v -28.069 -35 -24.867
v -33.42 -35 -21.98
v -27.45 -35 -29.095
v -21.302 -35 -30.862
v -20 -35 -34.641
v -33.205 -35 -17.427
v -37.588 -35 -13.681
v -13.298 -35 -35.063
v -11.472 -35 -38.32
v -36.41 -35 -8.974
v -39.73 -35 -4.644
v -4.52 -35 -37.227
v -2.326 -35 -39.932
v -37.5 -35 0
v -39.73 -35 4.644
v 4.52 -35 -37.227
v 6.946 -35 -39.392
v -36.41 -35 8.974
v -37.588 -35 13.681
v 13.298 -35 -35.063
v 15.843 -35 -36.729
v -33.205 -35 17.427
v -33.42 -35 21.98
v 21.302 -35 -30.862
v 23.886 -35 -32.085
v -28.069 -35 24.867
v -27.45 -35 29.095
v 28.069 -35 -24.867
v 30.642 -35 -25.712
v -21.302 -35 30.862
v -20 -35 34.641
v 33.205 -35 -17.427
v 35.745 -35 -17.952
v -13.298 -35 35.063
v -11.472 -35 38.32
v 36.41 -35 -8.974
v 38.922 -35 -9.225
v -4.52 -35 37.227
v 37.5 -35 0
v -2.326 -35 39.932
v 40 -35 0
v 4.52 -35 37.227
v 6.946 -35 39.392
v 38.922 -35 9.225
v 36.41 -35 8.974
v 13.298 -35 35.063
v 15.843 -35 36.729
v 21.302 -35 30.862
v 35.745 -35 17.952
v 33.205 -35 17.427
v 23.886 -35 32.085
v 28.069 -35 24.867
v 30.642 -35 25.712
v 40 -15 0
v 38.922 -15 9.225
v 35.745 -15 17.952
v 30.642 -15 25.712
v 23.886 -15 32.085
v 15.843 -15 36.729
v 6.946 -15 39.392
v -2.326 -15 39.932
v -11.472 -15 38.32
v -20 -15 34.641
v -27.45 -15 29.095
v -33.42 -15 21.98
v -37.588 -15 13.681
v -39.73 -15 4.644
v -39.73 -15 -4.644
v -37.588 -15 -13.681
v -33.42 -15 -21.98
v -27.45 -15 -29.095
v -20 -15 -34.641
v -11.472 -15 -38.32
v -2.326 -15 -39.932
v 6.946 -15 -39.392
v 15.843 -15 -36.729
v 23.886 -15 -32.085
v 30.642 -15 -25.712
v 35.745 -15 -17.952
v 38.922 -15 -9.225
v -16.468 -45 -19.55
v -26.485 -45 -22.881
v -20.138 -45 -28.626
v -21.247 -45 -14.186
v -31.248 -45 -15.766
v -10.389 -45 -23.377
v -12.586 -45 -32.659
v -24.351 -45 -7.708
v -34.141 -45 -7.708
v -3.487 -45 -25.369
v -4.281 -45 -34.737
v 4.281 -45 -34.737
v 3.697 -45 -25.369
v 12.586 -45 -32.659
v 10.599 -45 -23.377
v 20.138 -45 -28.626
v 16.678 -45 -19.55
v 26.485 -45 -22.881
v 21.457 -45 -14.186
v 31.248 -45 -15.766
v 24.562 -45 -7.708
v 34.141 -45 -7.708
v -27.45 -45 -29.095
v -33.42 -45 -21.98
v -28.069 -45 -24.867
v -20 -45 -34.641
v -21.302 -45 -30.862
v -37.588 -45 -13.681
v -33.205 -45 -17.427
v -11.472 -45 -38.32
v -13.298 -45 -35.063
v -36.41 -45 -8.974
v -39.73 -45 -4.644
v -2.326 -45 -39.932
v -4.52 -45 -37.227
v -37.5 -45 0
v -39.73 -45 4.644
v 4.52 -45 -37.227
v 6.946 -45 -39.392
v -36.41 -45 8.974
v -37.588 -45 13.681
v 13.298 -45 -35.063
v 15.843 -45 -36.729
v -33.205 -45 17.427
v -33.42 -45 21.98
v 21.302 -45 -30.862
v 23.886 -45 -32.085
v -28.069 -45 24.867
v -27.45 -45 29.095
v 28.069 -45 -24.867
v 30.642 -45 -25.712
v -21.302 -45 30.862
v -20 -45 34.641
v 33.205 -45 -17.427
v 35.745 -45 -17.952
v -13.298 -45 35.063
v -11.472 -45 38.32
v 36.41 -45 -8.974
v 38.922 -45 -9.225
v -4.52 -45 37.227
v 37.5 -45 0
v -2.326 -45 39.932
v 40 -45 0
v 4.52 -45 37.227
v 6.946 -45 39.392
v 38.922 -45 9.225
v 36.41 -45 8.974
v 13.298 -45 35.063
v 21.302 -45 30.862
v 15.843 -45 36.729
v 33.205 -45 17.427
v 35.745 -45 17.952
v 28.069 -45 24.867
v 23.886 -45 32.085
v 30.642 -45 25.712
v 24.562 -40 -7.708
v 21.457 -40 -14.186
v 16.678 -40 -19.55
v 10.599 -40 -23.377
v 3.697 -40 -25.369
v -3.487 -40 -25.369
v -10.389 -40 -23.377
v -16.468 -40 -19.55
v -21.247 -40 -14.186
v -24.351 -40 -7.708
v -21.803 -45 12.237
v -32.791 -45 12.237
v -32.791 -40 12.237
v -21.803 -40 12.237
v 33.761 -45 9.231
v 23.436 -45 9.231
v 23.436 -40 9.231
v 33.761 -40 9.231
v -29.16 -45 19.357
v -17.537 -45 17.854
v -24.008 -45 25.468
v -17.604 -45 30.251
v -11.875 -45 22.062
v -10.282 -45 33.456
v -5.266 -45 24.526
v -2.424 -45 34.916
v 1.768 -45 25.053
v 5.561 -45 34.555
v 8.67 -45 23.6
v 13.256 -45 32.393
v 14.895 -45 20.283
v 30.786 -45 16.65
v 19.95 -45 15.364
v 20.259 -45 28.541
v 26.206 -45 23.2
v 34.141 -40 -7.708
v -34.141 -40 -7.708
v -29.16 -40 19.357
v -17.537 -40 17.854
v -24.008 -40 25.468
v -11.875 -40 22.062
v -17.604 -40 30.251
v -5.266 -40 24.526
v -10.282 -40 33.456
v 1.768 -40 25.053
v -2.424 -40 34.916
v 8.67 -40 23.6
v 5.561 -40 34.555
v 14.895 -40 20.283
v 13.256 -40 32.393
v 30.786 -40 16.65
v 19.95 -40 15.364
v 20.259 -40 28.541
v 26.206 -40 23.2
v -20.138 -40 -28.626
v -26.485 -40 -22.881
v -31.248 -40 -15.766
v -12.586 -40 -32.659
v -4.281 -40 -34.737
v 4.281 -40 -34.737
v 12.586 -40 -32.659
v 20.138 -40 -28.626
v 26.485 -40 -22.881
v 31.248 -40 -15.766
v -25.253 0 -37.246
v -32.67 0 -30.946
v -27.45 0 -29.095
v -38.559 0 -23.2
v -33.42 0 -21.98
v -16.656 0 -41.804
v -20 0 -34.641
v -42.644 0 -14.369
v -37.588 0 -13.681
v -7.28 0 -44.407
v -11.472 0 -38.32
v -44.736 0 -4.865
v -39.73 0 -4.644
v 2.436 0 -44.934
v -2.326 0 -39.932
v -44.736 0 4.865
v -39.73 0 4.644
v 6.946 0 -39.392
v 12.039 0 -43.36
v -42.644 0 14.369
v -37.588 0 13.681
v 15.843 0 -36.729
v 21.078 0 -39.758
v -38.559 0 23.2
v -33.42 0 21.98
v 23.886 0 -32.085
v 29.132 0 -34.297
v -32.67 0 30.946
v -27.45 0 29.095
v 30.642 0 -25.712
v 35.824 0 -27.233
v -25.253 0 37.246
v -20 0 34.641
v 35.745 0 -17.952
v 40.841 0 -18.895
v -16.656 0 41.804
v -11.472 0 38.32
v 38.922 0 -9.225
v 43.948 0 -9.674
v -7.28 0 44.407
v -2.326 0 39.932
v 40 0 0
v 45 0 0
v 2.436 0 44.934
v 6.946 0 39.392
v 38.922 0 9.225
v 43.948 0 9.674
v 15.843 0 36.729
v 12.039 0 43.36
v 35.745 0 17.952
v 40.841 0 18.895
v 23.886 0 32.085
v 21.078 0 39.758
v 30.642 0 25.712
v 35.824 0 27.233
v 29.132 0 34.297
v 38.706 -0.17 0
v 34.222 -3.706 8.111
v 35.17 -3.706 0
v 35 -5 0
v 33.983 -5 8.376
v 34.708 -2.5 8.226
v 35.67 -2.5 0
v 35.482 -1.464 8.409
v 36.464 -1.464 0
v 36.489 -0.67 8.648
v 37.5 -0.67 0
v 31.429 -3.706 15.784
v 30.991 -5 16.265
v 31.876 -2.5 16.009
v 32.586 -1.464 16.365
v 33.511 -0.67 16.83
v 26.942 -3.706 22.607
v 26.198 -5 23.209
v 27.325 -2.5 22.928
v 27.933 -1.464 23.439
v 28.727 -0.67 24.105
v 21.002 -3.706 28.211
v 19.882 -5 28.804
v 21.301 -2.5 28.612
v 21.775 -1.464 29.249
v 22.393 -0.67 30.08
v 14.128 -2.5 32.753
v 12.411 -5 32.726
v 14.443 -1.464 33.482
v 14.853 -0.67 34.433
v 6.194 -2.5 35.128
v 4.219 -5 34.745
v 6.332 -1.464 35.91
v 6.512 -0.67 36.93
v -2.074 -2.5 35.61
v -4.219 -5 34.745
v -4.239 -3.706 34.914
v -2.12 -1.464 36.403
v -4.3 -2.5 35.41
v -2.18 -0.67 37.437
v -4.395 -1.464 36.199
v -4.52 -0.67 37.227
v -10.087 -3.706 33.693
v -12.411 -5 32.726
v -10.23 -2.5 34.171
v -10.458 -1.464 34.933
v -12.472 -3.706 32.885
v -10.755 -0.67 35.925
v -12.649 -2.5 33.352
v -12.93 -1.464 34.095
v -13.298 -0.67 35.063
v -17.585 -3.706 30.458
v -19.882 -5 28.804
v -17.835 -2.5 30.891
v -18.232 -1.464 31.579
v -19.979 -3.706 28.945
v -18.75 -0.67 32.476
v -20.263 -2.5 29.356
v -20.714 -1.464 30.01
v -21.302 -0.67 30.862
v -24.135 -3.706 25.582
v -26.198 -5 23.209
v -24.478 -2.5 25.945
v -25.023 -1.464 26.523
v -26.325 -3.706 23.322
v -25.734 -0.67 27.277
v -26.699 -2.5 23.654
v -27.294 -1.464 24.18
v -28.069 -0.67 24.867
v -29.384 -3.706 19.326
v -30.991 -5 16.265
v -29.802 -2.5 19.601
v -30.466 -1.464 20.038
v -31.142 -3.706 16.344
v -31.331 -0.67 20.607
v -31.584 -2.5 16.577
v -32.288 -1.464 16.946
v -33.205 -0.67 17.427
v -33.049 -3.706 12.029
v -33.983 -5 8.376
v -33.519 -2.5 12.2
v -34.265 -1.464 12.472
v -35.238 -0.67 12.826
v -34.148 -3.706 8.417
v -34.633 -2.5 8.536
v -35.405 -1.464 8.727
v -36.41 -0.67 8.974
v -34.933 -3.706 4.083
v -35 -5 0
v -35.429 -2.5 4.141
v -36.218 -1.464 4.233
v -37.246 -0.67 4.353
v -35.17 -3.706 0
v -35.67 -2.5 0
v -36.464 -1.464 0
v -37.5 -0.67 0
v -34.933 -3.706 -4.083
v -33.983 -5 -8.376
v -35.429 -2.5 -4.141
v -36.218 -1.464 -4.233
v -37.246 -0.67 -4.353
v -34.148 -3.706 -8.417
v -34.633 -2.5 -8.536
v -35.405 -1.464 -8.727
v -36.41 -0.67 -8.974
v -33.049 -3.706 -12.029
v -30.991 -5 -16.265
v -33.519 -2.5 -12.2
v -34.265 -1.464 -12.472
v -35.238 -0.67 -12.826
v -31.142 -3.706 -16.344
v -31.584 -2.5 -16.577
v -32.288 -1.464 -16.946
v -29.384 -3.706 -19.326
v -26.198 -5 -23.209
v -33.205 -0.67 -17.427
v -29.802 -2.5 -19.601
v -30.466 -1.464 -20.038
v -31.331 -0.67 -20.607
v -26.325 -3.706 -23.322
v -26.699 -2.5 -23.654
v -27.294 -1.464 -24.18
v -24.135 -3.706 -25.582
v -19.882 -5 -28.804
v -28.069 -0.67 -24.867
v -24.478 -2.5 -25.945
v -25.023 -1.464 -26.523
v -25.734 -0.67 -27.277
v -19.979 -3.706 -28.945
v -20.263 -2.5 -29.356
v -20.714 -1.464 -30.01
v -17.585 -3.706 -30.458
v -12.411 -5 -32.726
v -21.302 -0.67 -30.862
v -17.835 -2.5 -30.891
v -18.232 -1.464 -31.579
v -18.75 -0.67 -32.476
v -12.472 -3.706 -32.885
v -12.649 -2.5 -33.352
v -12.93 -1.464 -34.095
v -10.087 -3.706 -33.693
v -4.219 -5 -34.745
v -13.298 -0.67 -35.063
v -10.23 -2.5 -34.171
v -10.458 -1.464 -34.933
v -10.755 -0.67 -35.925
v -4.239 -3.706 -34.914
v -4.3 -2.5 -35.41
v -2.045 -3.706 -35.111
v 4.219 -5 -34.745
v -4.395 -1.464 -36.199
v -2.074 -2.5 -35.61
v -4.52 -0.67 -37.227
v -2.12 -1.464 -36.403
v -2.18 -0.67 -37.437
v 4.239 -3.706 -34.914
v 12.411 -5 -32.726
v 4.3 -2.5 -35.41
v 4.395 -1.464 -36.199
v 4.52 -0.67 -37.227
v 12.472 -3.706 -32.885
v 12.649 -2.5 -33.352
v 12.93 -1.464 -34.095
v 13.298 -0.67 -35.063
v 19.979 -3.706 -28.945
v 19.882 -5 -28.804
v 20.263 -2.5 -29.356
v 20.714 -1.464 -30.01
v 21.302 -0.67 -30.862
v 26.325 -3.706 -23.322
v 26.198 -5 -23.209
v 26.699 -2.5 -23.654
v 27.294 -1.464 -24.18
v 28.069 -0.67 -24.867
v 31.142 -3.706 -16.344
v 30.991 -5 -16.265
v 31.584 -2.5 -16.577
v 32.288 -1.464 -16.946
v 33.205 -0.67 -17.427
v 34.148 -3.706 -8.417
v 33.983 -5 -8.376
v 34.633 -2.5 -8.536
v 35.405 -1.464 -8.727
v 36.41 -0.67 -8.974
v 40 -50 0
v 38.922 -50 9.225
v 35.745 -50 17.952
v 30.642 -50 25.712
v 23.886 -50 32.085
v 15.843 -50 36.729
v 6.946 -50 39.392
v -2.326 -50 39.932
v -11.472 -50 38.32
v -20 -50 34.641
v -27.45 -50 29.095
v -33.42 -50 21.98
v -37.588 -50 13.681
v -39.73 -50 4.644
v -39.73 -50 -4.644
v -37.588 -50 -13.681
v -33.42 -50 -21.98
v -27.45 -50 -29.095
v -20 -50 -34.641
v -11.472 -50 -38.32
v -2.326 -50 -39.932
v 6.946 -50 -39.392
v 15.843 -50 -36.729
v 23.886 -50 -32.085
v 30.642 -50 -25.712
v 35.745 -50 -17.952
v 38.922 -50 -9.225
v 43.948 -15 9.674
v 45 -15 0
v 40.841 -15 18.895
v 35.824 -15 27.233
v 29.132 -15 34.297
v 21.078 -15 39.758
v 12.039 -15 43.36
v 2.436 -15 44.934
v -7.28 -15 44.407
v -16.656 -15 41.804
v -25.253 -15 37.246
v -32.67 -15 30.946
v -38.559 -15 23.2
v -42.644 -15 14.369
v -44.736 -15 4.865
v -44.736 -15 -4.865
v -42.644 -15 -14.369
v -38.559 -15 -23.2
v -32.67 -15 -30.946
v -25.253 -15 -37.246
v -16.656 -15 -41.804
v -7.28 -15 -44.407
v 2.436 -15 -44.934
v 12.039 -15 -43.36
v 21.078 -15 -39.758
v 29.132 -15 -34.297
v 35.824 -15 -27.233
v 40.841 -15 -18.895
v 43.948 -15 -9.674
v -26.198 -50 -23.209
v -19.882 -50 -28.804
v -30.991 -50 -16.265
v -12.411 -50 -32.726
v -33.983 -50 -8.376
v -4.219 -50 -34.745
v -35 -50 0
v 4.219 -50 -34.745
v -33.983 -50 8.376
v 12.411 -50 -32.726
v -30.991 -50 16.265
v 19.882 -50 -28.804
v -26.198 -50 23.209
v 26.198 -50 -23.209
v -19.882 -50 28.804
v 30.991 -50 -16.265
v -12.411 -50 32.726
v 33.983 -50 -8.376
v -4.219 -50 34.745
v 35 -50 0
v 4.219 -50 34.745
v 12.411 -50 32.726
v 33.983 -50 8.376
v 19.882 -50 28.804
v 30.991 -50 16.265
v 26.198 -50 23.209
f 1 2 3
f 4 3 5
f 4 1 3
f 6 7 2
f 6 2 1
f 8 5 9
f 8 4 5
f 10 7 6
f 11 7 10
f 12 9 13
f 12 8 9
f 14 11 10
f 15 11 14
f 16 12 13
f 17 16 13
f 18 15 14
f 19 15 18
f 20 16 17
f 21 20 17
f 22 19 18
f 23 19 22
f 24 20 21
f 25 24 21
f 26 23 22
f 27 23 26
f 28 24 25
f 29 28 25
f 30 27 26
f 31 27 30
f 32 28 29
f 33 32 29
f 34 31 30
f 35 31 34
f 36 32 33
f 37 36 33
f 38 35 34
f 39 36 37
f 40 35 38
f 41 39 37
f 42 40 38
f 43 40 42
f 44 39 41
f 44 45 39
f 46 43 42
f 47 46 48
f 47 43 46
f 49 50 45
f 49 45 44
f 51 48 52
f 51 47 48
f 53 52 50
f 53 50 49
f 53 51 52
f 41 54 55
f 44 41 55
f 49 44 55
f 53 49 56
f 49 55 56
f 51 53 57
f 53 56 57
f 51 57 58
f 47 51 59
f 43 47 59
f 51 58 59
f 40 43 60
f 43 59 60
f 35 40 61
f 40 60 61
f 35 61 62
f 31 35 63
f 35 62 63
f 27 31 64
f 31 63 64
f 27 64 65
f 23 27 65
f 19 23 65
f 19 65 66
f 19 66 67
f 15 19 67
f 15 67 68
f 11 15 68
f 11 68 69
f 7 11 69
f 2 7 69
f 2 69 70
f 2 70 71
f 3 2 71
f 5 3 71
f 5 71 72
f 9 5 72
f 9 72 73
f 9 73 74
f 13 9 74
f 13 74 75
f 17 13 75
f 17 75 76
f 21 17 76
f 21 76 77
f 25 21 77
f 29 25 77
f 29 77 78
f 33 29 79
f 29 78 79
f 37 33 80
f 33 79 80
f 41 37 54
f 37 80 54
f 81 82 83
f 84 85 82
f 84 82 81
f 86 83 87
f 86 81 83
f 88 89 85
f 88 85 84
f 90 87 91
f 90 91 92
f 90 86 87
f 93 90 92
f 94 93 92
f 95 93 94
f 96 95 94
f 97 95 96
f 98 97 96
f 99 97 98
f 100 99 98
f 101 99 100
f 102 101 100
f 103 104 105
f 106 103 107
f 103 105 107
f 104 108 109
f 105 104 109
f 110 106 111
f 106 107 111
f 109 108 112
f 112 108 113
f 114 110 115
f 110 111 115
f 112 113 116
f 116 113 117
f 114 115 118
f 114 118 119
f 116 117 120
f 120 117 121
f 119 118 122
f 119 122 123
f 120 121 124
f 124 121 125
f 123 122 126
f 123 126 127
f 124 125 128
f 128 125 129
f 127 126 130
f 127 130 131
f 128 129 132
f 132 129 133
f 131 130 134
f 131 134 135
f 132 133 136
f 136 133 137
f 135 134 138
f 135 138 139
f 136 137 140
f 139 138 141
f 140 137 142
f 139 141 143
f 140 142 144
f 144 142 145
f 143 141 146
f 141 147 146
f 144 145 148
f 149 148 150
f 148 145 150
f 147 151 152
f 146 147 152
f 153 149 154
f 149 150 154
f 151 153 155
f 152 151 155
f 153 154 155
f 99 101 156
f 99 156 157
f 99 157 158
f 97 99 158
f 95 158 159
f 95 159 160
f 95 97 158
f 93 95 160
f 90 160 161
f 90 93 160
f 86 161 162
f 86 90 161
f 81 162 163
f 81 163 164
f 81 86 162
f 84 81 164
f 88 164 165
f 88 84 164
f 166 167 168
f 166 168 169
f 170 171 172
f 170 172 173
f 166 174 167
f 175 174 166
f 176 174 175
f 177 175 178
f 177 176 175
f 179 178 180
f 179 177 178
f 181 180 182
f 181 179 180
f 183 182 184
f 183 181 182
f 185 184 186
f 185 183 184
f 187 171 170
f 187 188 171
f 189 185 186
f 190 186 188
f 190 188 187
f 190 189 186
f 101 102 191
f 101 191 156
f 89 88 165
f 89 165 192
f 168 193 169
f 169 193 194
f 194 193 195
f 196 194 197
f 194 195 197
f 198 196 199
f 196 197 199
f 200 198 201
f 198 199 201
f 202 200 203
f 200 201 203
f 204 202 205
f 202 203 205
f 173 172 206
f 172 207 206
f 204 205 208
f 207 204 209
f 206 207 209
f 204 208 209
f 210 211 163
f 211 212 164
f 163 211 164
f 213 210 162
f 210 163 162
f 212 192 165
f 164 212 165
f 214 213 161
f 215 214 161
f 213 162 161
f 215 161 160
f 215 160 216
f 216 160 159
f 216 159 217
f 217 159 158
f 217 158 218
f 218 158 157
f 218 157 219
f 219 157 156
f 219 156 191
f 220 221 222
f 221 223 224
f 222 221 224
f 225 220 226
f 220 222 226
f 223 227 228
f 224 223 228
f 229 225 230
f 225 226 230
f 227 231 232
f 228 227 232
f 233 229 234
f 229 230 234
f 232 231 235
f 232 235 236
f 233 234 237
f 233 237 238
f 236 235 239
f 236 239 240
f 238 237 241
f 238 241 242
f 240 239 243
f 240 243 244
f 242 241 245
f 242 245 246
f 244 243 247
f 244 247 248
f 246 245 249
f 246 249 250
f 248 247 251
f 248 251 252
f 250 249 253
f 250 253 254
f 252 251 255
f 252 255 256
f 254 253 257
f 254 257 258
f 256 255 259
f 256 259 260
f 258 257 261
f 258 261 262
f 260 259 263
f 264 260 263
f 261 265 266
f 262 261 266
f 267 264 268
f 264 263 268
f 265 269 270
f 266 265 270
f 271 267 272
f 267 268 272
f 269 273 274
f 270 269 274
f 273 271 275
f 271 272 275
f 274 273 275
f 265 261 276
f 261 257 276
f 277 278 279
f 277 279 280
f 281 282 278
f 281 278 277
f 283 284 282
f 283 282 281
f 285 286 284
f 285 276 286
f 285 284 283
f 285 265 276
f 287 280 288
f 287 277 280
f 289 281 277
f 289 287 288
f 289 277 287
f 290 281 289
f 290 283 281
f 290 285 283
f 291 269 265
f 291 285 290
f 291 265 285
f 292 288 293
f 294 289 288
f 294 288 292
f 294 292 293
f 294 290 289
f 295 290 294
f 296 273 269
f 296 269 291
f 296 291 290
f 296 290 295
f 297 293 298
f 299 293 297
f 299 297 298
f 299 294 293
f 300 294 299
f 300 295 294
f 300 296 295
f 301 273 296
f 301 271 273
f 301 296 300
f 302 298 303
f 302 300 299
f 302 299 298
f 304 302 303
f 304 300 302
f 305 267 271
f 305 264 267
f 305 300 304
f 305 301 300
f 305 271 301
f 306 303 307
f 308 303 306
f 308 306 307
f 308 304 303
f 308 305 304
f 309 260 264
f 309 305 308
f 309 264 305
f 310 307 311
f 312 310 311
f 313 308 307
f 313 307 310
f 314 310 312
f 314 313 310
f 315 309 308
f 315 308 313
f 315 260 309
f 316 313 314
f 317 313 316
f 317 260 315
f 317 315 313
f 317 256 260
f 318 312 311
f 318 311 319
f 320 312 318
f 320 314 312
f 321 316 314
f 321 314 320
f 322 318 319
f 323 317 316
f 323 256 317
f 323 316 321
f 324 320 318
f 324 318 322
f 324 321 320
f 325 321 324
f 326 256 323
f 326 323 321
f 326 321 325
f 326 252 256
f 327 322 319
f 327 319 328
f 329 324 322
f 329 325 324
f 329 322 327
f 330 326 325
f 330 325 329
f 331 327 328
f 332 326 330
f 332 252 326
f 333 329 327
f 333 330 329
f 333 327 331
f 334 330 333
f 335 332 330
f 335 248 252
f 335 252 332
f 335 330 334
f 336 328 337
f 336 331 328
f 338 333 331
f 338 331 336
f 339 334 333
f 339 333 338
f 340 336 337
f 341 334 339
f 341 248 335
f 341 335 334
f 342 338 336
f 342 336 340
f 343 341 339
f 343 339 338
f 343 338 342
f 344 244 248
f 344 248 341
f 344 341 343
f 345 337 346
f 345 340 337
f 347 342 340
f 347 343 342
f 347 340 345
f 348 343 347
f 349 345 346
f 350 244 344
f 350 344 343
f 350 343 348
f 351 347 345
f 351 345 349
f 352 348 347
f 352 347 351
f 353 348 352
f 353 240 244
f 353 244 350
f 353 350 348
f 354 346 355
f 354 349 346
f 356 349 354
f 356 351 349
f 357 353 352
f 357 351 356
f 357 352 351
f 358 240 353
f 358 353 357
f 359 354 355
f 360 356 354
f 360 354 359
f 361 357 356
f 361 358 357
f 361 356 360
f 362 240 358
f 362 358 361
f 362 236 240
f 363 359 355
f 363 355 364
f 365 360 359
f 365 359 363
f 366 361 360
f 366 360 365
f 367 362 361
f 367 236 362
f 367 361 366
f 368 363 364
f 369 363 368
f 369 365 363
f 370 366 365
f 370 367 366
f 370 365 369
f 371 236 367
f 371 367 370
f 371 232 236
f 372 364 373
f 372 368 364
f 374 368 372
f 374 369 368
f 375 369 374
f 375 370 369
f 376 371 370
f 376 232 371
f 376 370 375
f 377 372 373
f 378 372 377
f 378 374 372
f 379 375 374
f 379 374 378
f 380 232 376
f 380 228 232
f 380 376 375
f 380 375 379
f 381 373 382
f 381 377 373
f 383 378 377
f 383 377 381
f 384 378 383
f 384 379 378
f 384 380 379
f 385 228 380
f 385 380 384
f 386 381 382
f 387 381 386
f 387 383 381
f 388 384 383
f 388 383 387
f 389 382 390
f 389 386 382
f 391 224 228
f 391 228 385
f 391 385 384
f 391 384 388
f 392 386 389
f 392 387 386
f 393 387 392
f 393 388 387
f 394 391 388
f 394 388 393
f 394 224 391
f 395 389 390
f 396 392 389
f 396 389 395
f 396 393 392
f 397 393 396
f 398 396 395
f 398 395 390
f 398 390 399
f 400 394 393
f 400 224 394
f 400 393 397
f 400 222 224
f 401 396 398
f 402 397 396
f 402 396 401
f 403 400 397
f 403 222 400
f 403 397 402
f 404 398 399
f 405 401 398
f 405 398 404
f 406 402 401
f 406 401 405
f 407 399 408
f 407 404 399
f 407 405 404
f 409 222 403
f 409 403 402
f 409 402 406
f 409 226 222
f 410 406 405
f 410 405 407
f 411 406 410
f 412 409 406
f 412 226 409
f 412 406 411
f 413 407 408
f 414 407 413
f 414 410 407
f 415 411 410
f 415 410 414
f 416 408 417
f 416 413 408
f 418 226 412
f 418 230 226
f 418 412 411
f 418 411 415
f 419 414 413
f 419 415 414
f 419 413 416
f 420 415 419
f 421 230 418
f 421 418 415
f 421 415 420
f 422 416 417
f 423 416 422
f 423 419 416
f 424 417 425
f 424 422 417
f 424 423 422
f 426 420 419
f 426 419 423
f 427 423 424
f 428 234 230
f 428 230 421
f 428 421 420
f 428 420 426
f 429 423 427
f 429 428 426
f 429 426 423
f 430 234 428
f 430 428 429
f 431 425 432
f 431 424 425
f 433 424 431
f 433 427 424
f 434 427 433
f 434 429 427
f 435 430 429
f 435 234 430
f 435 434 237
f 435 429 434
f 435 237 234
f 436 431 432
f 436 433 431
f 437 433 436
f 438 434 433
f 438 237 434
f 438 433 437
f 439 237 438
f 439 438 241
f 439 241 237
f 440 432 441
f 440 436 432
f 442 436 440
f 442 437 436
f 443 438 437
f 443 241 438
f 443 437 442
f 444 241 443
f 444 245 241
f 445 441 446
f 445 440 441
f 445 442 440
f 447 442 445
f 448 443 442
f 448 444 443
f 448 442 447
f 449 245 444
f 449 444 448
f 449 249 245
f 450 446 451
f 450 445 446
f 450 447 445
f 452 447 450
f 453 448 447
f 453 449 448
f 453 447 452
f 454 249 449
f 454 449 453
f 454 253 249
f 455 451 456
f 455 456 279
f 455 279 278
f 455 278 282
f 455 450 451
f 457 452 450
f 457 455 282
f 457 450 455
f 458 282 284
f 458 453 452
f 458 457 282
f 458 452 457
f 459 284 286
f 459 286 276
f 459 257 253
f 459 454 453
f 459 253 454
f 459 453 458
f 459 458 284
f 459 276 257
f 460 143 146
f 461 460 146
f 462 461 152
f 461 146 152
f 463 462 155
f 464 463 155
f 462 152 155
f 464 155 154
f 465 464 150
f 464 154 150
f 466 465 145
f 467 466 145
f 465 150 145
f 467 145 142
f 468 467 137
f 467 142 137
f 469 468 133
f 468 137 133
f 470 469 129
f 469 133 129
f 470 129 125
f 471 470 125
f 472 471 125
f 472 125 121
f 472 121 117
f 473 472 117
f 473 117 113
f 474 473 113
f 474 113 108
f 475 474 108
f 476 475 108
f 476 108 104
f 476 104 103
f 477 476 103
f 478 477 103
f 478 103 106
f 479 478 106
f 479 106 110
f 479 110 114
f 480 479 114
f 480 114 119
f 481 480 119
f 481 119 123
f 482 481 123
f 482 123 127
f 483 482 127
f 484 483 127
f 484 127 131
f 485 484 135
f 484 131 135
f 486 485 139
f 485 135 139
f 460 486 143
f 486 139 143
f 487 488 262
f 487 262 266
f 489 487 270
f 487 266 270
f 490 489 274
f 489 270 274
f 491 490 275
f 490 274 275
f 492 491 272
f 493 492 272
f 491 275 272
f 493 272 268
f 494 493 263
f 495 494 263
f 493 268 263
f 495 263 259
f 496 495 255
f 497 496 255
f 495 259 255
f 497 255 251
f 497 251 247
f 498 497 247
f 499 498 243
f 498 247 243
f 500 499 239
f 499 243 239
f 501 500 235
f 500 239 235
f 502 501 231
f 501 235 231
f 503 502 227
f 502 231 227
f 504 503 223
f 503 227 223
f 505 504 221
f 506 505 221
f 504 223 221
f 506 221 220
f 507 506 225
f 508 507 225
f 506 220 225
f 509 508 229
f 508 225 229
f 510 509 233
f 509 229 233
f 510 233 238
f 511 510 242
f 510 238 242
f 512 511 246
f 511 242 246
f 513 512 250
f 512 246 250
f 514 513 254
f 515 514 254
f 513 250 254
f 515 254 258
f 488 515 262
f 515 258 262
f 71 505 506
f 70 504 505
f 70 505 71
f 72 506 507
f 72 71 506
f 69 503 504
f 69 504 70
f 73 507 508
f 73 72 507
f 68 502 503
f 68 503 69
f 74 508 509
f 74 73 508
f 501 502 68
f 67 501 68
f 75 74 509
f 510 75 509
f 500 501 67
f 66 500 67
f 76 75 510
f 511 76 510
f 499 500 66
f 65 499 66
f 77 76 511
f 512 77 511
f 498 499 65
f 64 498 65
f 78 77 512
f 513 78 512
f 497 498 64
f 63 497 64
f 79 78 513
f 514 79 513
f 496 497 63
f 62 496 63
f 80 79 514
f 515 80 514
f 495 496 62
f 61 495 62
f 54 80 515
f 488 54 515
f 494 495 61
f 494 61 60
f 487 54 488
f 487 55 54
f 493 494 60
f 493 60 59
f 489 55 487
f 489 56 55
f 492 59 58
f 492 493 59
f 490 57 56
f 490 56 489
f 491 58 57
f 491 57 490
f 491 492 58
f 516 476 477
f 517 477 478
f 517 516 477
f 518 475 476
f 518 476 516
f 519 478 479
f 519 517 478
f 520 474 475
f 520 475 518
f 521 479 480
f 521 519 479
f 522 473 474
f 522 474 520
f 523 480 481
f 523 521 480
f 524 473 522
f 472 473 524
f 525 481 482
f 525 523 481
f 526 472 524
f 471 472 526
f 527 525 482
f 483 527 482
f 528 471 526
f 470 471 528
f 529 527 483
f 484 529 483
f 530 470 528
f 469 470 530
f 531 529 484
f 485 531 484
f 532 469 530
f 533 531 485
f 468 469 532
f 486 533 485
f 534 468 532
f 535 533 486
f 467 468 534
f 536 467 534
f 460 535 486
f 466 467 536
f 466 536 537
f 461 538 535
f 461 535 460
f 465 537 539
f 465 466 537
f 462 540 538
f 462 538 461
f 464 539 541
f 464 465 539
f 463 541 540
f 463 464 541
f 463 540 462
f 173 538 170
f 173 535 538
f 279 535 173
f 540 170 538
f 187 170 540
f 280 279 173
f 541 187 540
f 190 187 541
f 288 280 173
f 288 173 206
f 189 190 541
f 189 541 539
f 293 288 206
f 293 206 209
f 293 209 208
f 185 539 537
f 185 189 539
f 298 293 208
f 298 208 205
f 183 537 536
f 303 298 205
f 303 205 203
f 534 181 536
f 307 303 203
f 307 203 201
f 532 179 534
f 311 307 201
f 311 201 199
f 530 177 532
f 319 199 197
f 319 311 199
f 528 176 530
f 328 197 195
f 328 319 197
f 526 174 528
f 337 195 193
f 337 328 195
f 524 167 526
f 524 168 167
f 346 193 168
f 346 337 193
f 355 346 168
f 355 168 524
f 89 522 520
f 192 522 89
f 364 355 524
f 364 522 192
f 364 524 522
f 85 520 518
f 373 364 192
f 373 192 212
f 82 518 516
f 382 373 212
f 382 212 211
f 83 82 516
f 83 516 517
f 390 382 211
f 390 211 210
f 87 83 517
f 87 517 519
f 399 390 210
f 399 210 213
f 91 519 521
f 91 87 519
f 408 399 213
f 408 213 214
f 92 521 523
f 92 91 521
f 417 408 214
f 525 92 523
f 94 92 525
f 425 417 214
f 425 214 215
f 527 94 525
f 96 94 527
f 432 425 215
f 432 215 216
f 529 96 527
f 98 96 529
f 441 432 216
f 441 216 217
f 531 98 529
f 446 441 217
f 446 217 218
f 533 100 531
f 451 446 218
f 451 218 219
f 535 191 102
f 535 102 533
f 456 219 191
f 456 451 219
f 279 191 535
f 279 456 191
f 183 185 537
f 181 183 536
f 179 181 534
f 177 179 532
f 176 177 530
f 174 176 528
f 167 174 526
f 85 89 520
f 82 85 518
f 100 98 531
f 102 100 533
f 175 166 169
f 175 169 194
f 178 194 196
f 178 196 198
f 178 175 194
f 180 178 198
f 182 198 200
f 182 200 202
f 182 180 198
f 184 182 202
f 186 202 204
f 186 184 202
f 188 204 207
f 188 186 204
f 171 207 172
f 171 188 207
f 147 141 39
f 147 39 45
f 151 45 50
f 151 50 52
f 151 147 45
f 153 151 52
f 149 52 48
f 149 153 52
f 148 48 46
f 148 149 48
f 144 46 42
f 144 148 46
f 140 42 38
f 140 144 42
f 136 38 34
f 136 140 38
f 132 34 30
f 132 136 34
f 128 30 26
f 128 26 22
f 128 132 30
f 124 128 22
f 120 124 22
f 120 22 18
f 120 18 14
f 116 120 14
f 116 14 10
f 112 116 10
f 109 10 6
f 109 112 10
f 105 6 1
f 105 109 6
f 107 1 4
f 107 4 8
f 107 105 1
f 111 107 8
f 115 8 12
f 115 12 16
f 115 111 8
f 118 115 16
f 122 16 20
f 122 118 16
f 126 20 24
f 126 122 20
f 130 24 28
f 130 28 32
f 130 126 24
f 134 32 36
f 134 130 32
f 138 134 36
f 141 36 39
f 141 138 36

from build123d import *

# Parameters (mm, degrees)
F0_R      = 40
F0_R_2    = 35
F1_DEPTH  = 50
F2_R      = 45
F2_R_2    = 35
F3_DEPTH  = 15
F4_R      = 5
F6_R      = 40
F6_R_2    = 37.5
F7_DEPTH  = 10
F9_DEPTH  = 5
F11_DEPTH = 5


with BuildPart() as f1:
    # F0 (on Front) → F1 (new body)
    with BuildSketch(Plane.XZ):
        Circle(F0_R)
        Circle(F0_R_2, mode=Mode.SUBTRACT)
    extrude(amount=F1_DEPTH)

    # F2 (on Front) → F3 (join)
    with BuildSketch(Plane.XZ):
        Circle(F2_R)
        Circle(F2_R_2, mode=Mode.SUBTRACT)
    extrude(amount=F3_DEPTH)

    # F4
    f4_edges = [f1.edges().sort_by_distance(p)[0] for p in [
        (-35, 0, 0),
    ]]
    fillet(f4_edges, radius=F4_R)

    # F6 (on offset) → F7 (cut)
    with BuildSketch(Plane.XZ.offset(45)):
        Circle(F6_R)
        Circle(F6_R_2, mode=Mode.SUBTRACT)
    extrude(amount=-F7_DEPTH, mode=Mode.SUBTRACT)

    # F8 (on offset) → F9 (join)
    with BuildSketch(Plane.XZ.offset(45)):
        with BuildLine():
            Line((23.4356336296, 9.2309236786), (33.7607767689, 9.2309236786))
            ThreePointArc((33.7607767689, 9.2309236786), (1.5790357434, 34.9643625156), (-32.7912801838, 12.2365004764))
            Line((-32.7912801838, 12.2365004764), (-21.8026206791, 12.2365004764))
            ThreePointArc((-21.8026206791, 12.2365004764), (1.7678734782, 25.0531540072), (23.4356336296, 9.2309236786))
        make_face()
    extrude(amount=-F9_DEPTH)

    # F10 (on offset) → F11 (join)
    with BuildSketch(Plane.XZ.offset(45)):
        with BuildLine():
            Line((-24.3510891636, -7.7079934607), (-34.1406918033, -7.7079934607))
            ThreePointArc((-34.1406918033, -7.7079934607), (0, -35), (34.1406918033, -7.7079934607))
            Line((34.1406918033, -7.7079934607), (24.5616502176, -7.7079934607))
            ThreePointArc((24.5616502176, -7.7079934607), (0.105280527, -25.6222077044), (-24.3510891636, -7.7079934607))
        make_face()
    extrude(amount=-F11_DEPTH)


solid = f1.part
